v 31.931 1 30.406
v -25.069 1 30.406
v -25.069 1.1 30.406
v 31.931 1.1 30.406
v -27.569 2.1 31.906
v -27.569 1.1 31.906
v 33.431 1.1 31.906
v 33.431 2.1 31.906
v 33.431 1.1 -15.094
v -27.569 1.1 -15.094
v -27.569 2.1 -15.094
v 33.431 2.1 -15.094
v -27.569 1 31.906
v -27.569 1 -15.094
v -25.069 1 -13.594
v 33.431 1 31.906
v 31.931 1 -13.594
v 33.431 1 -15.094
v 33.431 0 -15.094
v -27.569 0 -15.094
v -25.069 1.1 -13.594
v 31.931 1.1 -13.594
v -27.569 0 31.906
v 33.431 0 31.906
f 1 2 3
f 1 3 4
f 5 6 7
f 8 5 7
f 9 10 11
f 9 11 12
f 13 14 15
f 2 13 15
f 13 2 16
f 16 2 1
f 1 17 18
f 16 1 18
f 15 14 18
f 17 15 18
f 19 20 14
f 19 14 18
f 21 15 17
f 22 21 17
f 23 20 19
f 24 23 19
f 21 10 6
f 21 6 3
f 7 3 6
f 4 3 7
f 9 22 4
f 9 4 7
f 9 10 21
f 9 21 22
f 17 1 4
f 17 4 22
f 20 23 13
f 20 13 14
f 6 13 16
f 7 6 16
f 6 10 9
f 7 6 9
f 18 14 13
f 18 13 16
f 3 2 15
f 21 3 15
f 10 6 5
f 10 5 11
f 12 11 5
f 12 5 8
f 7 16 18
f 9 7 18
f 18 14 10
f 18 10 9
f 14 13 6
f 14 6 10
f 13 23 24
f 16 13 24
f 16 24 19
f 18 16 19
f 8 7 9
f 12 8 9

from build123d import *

# Parameters (mm, degrees)
SKETCH1_W           = 61
SKETCH1_H           = 47
BOSS_EXTRUDE1_DEPTH = 1
SKETCH2_W           = 61
SKETCH2_H           = 47
SKETCH2_W_2         = 57
SKETCH2_H_2         = 44
BOSS_EXTRUDE5_DEPTH = 0.1
BOSS_EXTRUDE3_START = 1.1
SKETCH1_3_W         = 61
SKETCH1_3_H         = 47
BOSS_EXTRUDE3_DEPTH = 1


with BuildPart() as part:
    # Sketch1 → Boss-Extrude1 (new body)
    with BuildSketch(Plane(origin=(0, 0, 0), x_dir=(1, 0, 0), z_dir=(0, 1, 0))):
        with Locations((2.931492843, -8.40593047)):
            Rectangle(SKETCH1_W, SKETCH1_H)
    extrude(amount=BOSS_EXTRUDE1_DEPTH)


with BuildPart() as body_2:
    # Sketch2 → Boss-Extrude5 (new body)
    with BuildSketch(Plane(origin=(0, 1, 0), x_dir=(1, 0, 0), z_dir=(0, 1, 0))):
        with Locations((2.931492843, -8.40593047)):
            Rectangle(SKETCH2_W, SKETCH2_H)
        with Locations((3.431492843, -8.40593047)):
            Rectangle(SKETCH2_W_2, SKETCH2_H_2, mode=Mode.SUBTRACT)
    extrude(amount=BOSS_EXTRUDE5_DEPTH)


with BuildPart() as body_3:
    # Sketch1<3> → Boss-Extrude3 (new body)
    with BuildSketch(Plane(origin=(0, 0, 0), x_dir=(1, 0, 0), z_dir=(0, 1, 0)).offset(BOSS_EXTRUDE3_START)):
        with Locations((2.931492843, -8.40593047)):
            Rectangle(SKETCH1_3_W, SKETCH1_3_H)
    extrude(amount=BOSS_EXTRUDE3_DEPTH)


solid = Compound([part.part, body_2.part, body_3.part])
